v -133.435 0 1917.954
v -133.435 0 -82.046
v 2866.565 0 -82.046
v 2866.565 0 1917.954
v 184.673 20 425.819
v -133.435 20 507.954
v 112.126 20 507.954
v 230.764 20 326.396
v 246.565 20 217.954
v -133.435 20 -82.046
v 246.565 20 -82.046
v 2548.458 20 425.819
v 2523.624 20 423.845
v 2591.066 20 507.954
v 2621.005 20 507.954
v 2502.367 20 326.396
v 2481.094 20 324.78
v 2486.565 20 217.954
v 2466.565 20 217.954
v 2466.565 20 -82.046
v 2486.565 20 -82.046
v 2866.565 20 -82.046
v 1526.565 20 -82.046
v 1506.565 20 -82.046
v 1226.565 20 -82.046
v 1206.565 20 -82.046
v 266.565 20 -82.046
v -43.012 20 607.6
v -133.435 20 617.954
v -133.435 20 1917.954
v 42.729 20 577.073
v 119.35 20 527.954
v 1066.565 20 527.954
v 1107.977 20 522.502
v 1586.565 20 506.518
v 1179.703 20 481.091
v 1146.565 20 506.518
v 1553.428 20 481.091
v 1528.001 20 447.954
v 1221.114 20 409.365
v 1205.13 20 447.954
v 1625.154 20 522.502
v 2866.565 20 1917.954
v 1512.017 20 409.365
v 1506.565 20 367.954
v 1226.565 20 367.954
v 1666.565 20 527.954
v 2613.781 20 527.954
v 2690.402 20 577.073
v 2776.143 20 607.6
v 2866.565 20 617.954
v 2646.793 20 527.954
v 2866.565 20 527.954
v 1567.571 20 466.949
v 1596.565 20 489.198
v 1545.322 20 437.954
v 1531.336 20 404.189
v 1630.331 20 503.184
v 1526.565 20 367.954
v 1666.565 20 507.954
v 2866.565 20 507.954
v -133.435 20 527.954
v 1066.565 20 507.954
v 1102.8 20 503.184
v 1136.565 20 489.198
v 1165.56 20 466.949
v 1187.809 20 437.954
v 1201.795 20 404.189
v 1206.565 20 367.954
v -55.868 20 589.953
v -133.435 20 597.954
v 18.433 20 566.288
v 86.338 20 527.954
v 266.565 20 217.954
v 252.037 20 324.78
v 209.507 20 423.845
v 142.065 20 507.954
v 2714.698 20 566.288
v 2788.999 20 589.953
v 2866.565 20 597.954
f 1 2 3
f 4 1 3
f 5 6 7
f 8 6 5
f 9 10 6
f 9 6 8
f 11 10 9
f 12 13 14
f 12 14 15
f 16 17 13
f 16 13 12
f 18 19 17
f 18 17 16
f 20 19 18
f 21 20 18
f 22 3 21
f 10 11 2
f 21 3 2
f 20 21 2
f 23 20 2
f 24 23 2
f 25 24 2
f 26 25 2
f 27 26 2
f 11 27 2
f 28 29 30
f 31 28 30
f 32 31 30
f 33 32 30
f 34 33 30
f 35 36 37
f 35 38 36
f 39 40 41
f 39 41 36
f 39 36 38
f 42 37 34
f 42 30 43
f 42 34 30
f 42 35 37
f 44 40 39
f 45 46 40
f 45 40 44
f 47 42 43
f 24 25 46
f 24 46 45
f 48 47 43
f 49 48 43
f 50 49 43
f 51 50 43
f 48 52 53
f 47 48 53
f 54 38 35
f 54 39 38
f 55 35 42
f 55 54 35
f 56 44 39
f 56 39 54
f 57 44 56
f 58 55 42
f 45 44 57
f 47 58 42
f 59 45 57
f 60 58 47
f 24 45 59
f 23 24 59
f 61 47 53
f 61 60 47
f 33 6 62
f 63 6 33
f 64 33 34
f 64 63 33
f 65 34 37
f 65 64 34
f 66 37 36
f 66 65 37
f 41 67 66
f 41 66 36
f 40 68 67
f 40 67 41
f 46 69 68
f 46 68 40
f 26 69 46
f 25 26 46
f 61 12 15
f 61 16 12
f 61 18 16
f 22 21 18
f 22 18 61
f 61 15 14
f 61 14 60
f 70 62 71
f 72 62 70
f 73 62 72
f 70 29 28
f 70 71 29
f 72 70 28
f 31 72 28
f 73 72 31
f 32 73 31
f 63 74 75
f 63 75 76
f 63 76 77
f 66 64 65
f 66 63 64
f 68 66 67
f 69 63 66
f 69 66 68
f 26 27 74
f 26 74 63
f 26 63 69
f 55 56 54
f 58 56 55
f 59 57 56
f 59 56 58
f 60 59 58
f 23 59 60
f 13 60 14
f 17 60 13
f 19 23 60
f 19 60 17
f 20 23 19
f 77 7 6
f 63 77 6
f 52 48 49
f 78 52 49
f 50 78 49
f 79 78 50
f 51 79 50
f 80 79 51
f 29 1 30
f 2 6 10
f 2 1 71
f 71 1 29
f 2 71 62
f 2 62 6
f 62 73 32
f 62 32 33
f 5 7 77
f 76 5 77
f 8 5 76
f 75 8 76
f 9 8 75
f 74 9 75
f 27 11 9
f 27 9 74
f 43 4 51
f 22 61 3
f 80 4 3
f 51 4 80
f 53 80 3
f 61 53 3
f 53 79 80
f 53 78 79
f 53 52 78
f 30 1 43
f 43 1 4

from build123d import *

# Parameters (mm, degrees)
ESQUISSE1_W        = 3000
ESQUISSE1_H        = 2000
BOSS_EXTRU_1_DEPTH = 20
BOSS_EXTRU_2_DEPTH = 0.0001
BOSS_EXTRU_6_DEPTH = 0.0002
ESQUISSE6_W        = 20
ESQUISSE6_H        = 300
BOSS_EXTRU_8_DEPTH = 0.0002
ESQUISSE7_W        = 20
ESQUISSE7_H        = 450
ESQUISSE7_W_2      = 1200
ESQUISSE7_H_2      = 20
BOSS_EXTRU_9_DEPTH = 0.0003


with BuildPart() as part:
    # Esquisse1 → Boss.-Extru.1 (new body)
    with BuildSketch(Plane(origin=(0, 0, 0), x_dir=(1, 0, 0), z_dir=(0, 1, 0))):
        with Locations((1366.565464178, -917.954094264)):
            Rectangle(ESQUISSE1_W, ESQUISSE1_H)
    extrude(amount=BOSS_EXTRU_1_DEPTH)

    # Esquisse2 → Boss.-Extru.2 (add)
    with BuildSketch(Plane(origin=(0, 20, 0), x_dir=(1, 0, 0), z_dir=(0, 1, 0))):
        with BuildLine():
            Line((2466.565464178, 82.045905736), (266.565464178, 82.045905736))
            Line((266.565464178, 82.045905736), (266.565464178, -217.954094264))
            ThreePointArc((266.565464178, -217.954094264), (149.408176652, -500.796806738), (-133.434535822, -617.954094264))
            Line((-133.434535822, -617.954094264), (-133.434535822, -1917.954094264))
            Line((-133.434535822, -1917.954094264), (2866.565464178, -1917.954094264))
            Line((2866.565464178, -1917.954094264), (2866.565464178, -617.954094264))
            ThreePointArc((2866.565464178, -617.954094264), (2583.722751703, -500.796806738), (2466.565464178, -217.954094264))
            Line((2466.565464178, -217.954094264), (2466.565464178, 82.045905736))
        make_face()
    extrude(amount=BOSS_EXTRU_2_DEPTH)

    # Esquisse5 → Boss.-Extru.6 (add)
    with BuildSketch(Plane(origin=(0, 20, 0), x_dir=(1, 0, 0), z_dir=(0, 1, 0))):
        with BuildLine():
            Line((266.565464178, 82.045905736), (246.565464178, 82.045905736))
            Line((246.565464178, 82.045905736), (246.565464178, -217.954094264))
            ThreePointArc((246.565464178, -217.954094264), (135.266041029, -486.654671115), (-133.434535822, -597.954094264))
            Line((-133.434535822, -597.954094264), (-133.434535822, -617.954094264))
            ThreePointArc((-133.434535822, -617.954094264), (149.408176652, -500.796806738), (266.565464178, -217.954094264))
            Line((266.565464178, -217.954094264), (266.565464178, 82.045905736))
        make_face()
    extrude(amount=BOSS_EXTRU_6_DEPTH)

    # Esquisse6 → Boss.-Extru.8 (add)
    with BuildSketch(Plane(origin=(0, 20, 0), x_dir=(1, 0, 0), z_dir=(0, 1, 0))):
        with BuildLine():
            Line((2486.565464178, -217.954094264), (2466.565464178, -217.954094264))
            ThreePointArc((2466.565464178, -217.954094264), (2583.722751703, -500.796806738), (2866.565464178, -617.954094264))
            Line((2866.565464178, -617.954094264), (2866.565464178, -597.954094264))
            ThreePointArc((2866.565464178, -597.954094264), (2597.864887327, -486.654671115), (2486.565464178, -217.954094264))
        make_face()
        with Locations((2476.565464178, -67.954094264)):
            Rectangle(ESQUISSE6_W, ESQUISSE6_H)
    extrude(amount=BOSS_EXTRU_8_DEPTH)

    # Esquisse7 → Boss.-Extru.9 (add)
    with BuildSketch(Plane(origin=(0, 20, 0), x_dir=(1, 0, 0), z_dir=(0, 1, 0))):
        with Locations((1216.565464178, -142.954094264)):
            Rectangle(ESQUISSE7_W, ESQUISSE7_H)
        with Locations((1516.565464178, -142.954094264)):
            Rectangle(ESQUISSE7_W, ESQUISSE7_H)
        with BuildLine():
            ThreePointArc((1526.565464178, -367.954094264), (1567.570514812, -466.94904363), (1666.565464178, -507.954094264))
            Line((1666.565464178, -507.954094264), (1666.565464178, -527.954094264))
            ThreePointArc((1666.565464178, -527.954094264), (1553.428379188, -481.091179254), (1506.565464178, -367.954094264))
            Line((1506.565464178, -367.954094264), (1526.565464178, -367.954094264))
        make_face()
        with BuildLine():
            ThreePointArc((1226.565464178, -367.954094264), (1179.702549168, -481.091179254), (1066.565464178, -527.954094264))
            Line((1066.565464178, -527.954094264), (1066.565464178, -507.954094264))
            ThreePointArc((1066.565464178, -507.954094264), (1165.560413544, -466.94904363), (1206.565464178, -367.954094264))
            Line((1206.565464178, -367.954094264), (1226.565464178, -367.954094264))
        make_face()
        with BuildLine():
            Line((1066.565464178, -507.954094264), (112.126047334, -507.954094264))
            ThreePointArc((112.126047334, -507.954094264), (99.44686126, -518.231057904), (86.338073936, -527.954094264))
            Line((86.338073936, -527.954094264), (1066.565464178, -527.954094264))
            Line((1066.565464178, -527.954094264), (1066.565464178, -507.954094264))
        make_face()
        with Locations((2266.565464178, -517.954094264)):
            Rectangle(ESQUISSE7_W_2, ESQUISSE7_H_2)
        with BuildLine():
            Line((112.126047334, -507.954094264), (-133.434535822, -507.954094264))
            Line((-133.434535822, -507.954094264), (-133.434535822, -527.954094264))
            Line((-133.434535822, -527.954094264), (86.338073936, -527.954094264))
            ThreePointArc((86.338073936, -527.954094264), (99.44686126, -518.231057904), (112.126047334, -507.954094264))
        make_face()
    extrude(amount=BOSS_EXTRU_9_DEPTH)


solid = part.part
